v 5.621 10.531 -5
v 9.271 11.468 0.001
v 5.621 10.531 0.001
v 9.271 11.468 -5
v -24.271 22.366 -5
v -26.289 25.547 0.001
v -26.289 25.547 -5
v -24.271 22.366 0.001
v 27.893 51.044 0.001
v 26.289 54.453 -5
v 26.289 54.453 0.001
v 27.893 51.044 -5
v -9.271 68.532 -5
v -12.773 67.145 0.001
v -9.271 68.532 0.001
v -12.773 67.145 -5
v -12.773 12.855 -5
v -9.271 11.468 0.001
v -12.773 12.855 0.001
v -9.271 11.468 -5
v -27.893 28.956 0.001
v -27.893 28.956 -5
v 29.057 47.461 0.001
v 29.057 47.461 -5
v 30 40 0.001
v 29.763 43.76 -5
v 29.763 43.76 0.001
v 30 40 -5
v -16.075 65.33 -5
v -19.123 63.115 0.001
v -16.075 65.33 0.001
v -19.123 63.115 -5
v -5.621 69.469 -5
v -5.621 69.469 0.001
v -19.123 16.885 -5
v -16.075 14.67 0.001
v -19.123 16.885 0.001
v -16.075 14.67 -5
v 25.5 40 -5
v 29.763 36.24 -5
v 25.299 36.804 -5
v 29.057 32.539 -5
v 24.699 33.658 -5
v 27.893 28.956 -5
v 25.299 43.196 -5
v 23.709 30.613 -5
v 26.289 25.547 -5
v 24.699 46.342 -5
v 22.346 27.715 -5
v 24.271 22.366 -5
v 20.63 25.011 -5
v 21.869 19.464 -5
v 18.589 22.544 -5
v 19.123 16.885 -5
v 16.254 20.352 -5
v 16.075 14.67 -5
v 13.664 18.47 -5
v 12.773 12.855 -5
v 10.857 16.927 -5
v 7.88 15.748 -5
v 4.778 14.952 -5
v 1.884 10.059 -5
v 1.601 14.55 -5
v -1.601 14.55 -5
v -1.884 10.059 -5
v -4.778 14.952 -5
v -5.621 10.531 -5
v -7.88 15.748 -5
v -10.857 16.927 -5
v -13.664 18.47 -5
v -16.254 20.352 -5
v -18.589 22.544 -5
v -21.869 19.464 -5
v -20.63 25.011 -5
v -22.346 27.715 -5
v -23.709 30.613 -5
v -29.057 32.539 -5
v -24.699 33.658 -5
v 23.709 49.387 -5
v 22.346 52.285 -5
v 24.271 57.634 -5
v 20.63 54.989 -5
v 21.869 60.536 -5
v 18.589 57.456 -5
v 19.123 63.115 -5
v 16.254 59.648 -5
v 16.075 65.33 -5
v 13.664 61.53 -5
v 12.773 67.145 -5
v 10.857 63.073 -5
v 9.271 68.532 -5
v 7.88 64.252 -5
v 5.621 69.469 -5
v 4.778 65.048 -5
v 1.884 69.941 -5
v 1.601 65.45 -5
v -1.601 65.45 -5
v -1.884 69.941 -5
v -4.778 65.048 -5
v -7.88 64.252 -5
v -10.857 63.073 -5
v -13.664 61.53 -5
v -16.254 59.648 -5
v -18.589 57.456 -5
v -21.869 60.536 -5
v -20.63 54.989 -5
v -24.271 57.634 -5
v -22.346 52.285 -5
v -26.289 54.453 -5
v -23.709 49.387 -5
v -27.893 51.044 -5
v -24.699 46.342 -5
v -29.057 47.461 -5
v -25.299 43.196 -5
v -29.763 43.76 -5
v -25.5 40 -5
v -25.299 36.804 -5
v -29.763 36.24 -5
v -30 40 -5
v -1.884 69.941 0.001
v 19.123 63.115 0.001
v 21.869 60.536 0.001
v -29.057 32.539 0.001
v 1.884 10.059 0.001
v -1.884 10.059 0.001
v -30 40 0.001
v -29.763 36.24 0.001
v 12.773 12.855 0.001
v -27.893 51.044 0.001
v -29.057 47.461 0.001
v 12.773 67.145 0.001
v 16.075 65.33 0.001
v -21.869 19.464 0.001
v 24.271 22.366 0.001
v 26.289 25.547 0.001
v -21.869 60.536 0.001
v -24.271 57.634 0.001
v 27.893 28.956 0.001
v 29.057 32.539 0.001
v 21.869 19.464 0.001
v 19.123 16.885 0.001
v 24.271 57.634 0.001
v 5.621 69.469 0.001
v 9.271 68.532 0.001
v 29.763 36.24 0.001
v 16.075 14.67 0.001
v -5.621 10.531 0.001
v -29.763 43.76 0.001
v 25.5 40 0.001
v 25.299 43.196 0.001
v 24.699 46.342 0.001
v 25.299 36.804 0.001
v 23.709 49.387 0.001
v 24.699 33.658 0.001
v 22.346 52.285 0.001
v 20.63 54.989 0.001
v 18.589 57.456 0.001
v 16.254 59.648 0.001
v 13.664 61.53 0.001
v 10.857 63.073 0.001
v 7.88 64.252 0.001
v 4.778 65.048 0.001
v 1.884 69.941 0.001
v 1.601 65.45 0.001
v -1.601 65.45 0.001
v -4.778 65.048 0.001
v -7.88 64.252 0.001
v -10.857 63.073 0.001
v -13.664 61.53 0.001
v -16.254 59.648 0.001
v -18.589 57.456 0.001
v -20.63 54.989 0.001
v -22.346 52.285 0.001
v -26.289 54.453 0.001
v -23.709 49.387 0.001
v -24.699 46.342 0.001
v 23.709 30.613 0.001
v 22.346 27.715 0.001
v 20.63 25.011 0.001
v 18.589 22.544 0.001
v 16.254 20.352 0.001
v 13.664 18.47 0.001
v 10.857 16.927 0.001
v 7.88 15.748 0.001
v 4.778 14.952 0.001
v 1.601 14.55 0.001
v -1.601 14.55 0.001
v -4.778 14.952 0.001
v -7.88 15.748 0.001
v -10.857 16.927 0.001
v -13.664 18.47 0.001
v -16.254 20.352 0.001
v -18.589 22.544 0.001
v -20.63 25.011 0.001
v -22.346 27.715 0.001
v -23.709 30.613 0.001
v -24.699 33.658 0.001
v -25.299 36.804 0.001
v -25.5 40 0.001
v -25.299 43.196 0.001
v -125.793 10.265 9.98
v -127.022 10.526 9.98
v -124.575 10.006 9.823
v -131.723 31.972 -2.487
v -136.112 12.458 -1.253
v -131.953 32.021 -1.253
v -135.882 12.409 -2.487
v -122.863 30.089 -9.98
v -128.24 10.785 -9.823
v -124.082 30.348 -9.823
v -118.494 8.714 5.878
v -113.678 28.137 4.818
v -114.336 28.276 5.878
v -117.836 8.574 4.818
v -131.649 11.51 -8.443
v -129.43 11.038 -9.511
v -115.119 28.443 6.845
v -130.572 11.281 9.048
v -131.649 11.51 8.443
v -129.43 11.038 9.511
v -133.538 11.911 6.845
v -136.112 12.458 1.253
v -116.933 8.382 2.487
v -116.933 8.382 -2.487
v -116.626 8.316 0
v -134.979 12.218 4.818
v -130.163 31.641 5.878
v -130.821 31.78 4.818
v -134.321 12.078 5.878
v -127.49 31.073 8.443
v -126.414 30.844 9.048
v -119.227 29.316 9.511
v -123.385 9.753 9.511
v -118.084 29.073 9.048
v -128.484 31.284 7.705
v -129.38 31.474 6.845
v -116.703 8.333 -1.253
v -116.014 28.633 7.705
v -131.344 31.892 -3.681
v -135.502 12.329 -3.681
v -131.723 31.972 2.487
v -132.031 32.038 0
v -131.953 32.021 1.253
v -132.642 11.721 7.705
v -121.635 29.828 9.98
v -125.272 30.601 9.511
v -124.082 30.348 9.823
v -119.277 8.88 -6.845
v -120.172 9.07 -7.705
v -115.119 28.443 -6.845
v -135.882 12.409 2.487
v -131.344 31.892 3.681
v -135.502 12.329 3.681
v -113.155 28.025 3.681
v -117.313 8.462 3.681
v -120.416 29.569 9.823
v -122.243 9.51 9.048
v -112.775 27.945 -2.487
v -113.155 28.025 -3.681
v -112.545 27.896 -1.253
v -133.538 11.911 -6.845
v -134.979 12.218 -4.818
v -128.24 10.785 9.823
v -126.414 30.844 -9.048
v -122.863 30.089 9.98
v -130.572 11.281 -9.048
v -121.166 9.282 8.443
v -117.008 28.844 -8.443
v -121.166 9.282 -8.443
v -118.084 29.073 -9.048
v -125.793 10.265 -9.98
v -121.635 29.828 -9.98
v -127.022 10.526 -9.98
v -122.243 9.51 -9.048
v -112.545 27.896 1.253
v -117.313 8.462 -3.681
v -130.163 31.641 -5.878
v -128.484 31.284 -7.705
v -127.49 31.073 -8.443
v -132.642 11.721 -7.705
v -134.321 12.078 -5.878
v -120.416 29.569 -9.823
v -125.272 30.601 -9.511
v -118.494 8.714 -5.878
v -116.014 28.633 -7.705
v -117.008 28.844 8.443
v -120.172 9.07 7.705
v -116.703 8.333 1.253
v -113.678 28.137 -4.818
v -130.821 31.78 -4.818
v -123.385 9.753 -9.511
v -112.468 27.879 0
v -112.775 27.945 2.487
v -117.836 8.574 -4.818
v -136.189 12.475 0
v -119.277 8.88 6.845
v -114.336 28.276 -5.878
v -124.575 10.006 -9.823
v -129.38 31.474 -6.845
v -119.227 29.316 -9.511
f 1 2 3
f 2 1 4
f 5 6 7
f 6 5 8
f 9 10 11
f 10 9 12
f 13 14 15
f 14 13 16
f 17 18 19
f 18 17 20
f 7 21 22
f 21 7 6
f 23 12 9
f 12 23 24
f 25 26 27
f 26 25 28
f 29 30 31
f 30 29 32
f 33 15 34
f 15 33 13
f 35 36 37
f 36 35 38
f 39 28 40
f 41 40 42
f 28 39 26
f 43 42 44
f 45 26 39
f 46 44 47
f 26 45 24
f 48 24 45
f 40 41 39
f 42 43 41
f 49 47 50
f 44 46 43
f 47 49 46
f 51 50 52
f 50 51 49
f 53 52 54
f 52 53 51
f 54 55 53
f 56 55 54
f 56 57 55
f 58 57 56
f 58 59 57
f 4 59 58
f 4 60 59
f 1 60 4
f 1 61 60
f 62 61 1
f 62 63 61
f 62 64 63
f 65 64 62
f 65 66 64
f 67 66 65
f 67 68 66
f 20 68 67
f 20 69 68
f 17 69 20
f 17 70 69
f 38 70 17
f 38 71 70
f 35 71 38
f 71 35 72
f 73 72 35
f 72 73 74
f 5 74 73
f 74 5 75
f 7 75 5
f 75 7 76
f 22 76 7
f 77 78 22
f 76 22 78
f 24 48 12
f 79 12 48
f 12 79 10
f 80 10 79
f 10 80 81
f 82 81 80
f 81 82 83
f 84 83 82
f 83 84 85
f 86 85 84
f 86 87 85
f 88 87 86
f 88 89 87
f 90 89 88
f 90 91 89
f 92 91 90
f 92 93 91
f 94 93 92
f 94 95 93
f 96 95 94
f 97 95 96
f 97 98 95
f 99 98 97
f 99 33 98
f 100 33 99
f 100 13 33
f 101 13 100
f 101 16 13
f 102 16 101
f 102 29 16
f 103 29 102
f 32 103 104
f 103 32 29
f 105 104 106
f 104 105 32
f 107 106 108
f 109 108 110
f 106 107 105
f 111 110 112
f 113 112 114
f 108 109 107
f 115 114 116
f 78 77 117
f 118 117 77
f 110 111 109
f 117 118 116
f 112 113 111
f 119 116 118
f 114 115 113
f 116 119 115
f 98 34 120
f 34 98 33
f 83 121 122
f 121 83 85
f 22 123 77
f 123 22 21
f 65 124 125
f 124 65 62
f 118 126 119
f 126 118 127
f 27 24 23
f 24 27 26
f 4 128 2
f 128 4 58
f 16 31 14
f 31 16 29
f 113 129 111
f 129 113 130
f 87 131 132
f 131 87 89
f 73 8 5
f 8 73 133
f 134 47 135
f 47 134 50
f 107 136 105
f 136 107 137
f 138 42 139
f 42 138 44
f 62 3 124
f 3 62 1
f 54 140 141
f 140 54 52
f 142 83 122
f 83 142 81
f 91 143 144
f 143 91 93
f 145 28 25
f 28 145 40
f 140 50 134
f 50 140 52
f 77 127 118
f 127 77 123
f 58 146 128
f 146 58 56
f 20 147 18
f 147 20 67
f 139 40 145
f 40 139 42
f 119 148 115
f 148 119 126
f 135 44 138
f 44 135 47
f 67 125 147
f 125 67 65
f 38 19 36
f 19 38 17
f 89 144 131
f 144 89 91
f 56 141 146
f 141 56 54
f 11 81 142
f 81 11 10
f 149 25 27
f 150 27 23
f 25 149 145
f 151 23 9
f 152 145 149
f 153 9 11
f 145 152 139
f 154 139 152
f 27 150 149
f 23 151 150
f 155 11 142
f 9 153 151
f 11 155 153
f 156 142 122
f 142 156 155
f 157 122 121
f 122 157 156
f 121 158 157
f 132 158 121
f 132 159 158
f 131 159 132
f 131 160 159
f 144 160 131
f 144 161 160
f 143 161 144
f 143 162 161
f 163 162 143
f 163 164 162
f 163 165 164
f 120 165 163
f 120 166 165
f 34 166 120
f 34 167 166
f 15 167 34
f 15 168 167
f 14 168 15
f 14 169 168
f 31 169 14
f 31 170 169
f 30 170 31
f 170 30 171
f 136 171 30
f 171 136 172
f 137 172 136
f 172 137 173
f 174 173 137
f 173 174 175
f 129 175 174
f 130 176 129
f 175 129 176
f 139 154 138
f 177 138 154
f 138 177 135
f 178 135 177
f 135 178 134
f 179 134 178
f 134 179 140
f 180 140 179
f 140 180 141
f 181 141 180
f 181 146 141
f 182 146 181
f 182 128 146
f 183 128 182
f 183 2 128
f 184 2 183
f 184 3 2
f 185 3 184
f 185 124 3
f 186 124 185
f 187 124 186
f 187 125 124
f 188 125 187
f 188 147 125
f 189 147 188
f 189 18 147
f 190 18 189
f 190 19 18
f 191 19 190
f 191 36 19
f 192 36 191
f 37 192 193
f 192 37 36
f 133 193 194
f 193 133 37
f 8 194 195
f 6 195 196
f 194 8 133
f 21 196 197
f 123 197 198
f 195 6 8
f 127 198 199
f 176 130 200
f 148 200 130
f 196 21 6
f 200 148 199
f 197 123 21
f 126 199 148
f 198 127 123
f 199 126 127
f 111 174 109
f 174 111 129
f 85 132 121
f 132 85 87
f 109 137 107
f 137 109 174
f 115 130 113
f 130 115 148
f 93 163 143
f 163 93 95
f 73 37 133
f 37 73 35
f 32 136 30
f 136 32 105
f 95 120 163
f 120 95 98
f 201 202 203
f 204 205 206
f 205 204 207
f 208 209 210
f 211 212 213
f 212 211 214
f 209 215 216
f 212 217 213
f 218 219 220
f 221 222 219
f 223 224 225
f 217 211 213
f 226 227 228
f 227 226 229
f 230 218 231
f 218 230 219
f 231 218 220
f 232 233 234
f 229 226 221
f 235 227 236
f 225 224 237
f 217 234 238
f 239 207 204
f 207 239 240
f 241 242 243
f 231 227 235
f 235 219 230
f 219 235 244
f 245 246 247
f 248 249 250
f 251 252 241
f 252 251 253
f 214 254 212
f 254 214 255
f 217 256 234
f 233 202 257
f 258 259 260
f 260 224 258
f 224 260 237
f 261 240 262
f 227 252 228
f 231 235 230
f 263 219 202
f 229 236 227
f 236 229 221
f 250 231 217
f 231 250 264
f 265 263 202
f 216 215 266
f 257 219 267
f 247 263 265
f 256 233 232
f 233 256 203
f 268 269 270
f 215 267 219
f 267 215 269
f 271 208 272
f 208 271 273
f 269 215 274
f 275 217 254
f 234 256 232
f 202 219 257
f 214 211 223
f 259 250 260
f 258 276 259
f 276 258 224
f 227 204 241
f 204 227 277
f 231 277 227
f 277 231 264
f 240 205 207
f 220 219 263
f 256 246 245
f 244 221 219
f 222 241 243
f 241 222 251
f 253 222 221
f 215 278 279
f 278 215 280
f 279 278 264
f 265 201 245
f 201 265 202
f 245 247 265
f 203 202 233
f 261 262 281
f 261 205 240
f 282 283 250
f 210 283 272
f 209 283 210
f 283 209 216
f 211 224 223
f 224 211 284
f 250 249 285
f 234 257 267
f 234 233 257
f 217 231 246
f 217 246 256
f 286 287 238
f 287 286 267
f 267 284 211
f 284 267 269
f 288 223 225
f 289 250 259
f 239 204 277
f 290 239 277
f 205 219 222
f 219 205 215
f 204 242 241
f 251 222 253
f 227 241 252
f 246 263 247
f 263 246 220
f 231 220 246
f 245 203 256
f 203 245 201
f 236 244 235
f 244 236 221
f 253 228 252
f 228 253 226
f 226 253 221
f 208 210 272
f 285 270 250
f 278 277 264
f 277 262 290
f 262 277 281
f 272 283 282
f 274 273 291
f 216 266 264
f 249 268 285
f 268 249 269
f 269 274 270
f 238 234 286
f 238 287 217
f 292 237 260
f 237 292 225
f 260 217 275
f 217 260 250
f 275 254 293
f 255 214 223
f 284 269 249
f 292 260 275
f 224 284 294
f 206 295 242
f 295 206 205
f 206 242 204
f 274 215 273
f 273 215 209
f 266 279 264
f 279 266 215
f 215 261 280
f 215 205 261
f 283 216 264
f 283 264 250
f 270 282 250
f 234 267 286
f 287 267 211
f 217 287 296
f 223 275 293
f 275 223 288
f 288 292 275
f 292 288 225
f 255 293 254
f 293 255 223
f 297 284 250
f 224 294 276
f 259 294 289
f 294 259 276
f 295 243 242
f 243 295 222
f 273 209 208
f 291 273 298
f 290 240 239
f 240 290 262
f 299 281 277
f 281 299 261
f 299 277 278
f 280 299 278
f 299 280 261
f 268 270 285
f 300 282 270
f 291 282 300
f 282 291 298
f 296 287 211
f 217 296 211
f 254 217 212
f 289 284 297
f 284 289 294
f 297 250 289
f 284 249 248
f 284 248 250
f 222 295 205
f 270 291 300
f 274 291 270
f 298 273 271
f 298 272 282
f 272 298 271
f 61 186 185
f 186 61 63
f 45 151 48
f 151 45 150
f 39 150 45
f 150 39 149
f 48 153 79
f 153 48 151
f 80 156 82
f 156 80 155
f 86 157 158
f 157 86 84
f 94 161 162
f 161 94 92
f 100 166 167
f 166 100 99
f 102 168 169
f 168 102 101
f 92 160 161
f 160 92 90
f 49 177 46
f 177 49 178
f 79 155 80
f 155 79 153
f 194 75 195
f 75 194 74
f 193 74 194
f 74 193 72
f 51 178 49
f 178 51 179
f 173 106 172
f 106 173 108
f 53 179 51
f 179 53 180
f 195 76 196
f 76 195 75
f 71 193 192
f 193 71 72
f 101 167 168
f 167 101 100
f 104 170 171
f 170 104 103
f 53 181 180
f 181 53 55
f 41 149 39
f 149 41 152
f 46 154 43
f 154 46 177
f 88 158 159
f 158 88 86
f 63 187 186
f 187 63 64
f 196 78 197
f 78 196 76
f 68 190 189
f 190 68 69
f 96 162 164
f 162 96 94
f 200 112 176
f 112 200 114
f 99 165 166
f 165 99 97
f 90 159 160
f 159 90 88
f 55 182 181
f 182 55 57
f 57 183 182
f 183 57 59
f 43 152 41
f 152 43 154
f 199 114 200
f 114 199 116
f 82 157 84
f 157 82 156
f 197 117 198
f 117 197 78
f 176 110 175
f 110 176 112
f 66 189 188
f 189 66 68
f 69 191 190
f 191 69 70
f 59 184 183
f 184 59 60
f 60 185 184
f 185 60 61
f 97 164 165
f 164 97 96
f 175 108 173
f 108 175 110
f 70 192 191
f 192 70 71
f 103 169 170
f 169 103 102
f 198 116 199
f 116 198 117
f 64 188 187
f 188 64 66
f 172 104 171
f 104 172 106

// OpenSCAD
// file: front_plug_common.scad
receptacleOuterDia=80;
receptacleInnerDia=45;

receptacleMountingRingInsetDia=61;

receptacleBracketBaseWidth=130;
receptacleBracketBaseCornerRadius=3;

motorMountPlateWidth=155;

// This is how far the transition casing sticks back from the trailing edge of the motor mount.
transitionWidthAtV=100;

motorMountPlateVOffset=114;

motorMountPlateVOffsetShortSide=motorMountPlateWidth-motorMountPlateVOffset;
// main file
include <front_plug_common.scad>

surfaceThickness=0.01;
// Block that goes behind the receptacle bracket and over the top
// cord and triangle patch

frontInsertionDepth=5;
frontInsertionRimWidth=5;
frontInsertionTolerance=0.5;

frontPlateToMotorMountEdgeWidth=25;

overlap=0.001;
$fn=50;

// the plate will be mounted centered
// the corner of the lower transition plate will align with the V underneath
transitionCornerXoffset=-motorMountPlateWidth/2-motorMountPlateVOffsetShortSide;

difference() {
    union() {
        // matching plate for back of receptacle bracket.
        %hull() {
            // left base corner
            translate([-receptacleBracketBaseWidth/2+receptacleBracketBaseCornerRadius,
                    receptacleBracketBaseCornerRadius,0]) 
                cylinder(r=receptacleBracketBaseCornerRadius, h=surfaceThickness);
            // right base corner
            translate([receptacleBracketBaseWidth/2-receptacleBracketBaseCornerRadius,
                    receptacleBracketBaseCornerRadius,0]) 
                cylinder(r=receptacleBracketBaseCornerRadius, h=surfaceThickness);
            translate([0,receptacleOuterDia/2,0]) 
                cylinder(d=receptacleOuterDia, h=surfaceThickness);
            // right edge/corner of motor mount plate
            translate([motorMountPlateWidth/2,receptacleBracketBaseCornerRadius/2,
                    frontPlateToMotorMountEdgeWidth])
                cylinder(d=receptacleBracketBaseCornerRadius, h=surfaceThickness);
            // left edge/corner of motor mount plate
            translate([-motorMountPlateWidth/2,receptacleBracketBaseCornerRadius/2,
                    frontPlateToMotorMountEdgeWidth])
                cylinder(d=receptacleBracketBaseCornerRadius, h=surfaceThickness);
            // rear corner of transition cover aligned with the "V"
            translate([-motorMountPlateVOffsetShortSide,receptacleBracketBaseCornerRadius/2,
                frontPlateToMotorMountEdgeWidth+transitionWidthAtV])
                    rotate([0,-45,0])
                    cylinder(d=receptacleBracketBaseCornerRadius, h=surfaceThickness);
            // rear corner of transition cover at the edge of the boat
            translate([-motorMountPlateWidth/2,receptacleBracketBaseCornerRadius/2,
                frontPlateToMotorMountEdgeWidth+transitionWidthAtV])
                    rotate([0,-90,0])
                    cylinder(d=receptacleBracketBaseCornerRadius, h=surfaceThickness);
            }
        
        // part that inserts a little into the back of the receptacle bracket
        // to align.
        translate([0,receptacleOuterDia/2,-frontInsertionDepth]) 
            cylinder(d=receptacleMountingRingInsetDia-frontInsertionTolerance*2,
                h=frontInsertionDepth+overlap);
        
        // Wire tunnel over the top of the boat
            translate([-motorMountPlateWidth/2,0,0])
        rotate([0,0,-12])
        rotate([-90,0,0])
        translate([-50,0,0])
        hull() {
            translate([])
                cylinder(d=20, h=20);
        }    
    }
    // Wire thru-hole from insertion plate through front of insertion cylinder
    translate([0,receptacleOuterDia/2,-frontInsertionDepth-overlap]) 
        cylinder(d=receptacleMountingRingInsetDia-frontInsertionRimWidth*2, 
            h=frontInsertionDepth+overlap*2+surfaceThickness);
}
